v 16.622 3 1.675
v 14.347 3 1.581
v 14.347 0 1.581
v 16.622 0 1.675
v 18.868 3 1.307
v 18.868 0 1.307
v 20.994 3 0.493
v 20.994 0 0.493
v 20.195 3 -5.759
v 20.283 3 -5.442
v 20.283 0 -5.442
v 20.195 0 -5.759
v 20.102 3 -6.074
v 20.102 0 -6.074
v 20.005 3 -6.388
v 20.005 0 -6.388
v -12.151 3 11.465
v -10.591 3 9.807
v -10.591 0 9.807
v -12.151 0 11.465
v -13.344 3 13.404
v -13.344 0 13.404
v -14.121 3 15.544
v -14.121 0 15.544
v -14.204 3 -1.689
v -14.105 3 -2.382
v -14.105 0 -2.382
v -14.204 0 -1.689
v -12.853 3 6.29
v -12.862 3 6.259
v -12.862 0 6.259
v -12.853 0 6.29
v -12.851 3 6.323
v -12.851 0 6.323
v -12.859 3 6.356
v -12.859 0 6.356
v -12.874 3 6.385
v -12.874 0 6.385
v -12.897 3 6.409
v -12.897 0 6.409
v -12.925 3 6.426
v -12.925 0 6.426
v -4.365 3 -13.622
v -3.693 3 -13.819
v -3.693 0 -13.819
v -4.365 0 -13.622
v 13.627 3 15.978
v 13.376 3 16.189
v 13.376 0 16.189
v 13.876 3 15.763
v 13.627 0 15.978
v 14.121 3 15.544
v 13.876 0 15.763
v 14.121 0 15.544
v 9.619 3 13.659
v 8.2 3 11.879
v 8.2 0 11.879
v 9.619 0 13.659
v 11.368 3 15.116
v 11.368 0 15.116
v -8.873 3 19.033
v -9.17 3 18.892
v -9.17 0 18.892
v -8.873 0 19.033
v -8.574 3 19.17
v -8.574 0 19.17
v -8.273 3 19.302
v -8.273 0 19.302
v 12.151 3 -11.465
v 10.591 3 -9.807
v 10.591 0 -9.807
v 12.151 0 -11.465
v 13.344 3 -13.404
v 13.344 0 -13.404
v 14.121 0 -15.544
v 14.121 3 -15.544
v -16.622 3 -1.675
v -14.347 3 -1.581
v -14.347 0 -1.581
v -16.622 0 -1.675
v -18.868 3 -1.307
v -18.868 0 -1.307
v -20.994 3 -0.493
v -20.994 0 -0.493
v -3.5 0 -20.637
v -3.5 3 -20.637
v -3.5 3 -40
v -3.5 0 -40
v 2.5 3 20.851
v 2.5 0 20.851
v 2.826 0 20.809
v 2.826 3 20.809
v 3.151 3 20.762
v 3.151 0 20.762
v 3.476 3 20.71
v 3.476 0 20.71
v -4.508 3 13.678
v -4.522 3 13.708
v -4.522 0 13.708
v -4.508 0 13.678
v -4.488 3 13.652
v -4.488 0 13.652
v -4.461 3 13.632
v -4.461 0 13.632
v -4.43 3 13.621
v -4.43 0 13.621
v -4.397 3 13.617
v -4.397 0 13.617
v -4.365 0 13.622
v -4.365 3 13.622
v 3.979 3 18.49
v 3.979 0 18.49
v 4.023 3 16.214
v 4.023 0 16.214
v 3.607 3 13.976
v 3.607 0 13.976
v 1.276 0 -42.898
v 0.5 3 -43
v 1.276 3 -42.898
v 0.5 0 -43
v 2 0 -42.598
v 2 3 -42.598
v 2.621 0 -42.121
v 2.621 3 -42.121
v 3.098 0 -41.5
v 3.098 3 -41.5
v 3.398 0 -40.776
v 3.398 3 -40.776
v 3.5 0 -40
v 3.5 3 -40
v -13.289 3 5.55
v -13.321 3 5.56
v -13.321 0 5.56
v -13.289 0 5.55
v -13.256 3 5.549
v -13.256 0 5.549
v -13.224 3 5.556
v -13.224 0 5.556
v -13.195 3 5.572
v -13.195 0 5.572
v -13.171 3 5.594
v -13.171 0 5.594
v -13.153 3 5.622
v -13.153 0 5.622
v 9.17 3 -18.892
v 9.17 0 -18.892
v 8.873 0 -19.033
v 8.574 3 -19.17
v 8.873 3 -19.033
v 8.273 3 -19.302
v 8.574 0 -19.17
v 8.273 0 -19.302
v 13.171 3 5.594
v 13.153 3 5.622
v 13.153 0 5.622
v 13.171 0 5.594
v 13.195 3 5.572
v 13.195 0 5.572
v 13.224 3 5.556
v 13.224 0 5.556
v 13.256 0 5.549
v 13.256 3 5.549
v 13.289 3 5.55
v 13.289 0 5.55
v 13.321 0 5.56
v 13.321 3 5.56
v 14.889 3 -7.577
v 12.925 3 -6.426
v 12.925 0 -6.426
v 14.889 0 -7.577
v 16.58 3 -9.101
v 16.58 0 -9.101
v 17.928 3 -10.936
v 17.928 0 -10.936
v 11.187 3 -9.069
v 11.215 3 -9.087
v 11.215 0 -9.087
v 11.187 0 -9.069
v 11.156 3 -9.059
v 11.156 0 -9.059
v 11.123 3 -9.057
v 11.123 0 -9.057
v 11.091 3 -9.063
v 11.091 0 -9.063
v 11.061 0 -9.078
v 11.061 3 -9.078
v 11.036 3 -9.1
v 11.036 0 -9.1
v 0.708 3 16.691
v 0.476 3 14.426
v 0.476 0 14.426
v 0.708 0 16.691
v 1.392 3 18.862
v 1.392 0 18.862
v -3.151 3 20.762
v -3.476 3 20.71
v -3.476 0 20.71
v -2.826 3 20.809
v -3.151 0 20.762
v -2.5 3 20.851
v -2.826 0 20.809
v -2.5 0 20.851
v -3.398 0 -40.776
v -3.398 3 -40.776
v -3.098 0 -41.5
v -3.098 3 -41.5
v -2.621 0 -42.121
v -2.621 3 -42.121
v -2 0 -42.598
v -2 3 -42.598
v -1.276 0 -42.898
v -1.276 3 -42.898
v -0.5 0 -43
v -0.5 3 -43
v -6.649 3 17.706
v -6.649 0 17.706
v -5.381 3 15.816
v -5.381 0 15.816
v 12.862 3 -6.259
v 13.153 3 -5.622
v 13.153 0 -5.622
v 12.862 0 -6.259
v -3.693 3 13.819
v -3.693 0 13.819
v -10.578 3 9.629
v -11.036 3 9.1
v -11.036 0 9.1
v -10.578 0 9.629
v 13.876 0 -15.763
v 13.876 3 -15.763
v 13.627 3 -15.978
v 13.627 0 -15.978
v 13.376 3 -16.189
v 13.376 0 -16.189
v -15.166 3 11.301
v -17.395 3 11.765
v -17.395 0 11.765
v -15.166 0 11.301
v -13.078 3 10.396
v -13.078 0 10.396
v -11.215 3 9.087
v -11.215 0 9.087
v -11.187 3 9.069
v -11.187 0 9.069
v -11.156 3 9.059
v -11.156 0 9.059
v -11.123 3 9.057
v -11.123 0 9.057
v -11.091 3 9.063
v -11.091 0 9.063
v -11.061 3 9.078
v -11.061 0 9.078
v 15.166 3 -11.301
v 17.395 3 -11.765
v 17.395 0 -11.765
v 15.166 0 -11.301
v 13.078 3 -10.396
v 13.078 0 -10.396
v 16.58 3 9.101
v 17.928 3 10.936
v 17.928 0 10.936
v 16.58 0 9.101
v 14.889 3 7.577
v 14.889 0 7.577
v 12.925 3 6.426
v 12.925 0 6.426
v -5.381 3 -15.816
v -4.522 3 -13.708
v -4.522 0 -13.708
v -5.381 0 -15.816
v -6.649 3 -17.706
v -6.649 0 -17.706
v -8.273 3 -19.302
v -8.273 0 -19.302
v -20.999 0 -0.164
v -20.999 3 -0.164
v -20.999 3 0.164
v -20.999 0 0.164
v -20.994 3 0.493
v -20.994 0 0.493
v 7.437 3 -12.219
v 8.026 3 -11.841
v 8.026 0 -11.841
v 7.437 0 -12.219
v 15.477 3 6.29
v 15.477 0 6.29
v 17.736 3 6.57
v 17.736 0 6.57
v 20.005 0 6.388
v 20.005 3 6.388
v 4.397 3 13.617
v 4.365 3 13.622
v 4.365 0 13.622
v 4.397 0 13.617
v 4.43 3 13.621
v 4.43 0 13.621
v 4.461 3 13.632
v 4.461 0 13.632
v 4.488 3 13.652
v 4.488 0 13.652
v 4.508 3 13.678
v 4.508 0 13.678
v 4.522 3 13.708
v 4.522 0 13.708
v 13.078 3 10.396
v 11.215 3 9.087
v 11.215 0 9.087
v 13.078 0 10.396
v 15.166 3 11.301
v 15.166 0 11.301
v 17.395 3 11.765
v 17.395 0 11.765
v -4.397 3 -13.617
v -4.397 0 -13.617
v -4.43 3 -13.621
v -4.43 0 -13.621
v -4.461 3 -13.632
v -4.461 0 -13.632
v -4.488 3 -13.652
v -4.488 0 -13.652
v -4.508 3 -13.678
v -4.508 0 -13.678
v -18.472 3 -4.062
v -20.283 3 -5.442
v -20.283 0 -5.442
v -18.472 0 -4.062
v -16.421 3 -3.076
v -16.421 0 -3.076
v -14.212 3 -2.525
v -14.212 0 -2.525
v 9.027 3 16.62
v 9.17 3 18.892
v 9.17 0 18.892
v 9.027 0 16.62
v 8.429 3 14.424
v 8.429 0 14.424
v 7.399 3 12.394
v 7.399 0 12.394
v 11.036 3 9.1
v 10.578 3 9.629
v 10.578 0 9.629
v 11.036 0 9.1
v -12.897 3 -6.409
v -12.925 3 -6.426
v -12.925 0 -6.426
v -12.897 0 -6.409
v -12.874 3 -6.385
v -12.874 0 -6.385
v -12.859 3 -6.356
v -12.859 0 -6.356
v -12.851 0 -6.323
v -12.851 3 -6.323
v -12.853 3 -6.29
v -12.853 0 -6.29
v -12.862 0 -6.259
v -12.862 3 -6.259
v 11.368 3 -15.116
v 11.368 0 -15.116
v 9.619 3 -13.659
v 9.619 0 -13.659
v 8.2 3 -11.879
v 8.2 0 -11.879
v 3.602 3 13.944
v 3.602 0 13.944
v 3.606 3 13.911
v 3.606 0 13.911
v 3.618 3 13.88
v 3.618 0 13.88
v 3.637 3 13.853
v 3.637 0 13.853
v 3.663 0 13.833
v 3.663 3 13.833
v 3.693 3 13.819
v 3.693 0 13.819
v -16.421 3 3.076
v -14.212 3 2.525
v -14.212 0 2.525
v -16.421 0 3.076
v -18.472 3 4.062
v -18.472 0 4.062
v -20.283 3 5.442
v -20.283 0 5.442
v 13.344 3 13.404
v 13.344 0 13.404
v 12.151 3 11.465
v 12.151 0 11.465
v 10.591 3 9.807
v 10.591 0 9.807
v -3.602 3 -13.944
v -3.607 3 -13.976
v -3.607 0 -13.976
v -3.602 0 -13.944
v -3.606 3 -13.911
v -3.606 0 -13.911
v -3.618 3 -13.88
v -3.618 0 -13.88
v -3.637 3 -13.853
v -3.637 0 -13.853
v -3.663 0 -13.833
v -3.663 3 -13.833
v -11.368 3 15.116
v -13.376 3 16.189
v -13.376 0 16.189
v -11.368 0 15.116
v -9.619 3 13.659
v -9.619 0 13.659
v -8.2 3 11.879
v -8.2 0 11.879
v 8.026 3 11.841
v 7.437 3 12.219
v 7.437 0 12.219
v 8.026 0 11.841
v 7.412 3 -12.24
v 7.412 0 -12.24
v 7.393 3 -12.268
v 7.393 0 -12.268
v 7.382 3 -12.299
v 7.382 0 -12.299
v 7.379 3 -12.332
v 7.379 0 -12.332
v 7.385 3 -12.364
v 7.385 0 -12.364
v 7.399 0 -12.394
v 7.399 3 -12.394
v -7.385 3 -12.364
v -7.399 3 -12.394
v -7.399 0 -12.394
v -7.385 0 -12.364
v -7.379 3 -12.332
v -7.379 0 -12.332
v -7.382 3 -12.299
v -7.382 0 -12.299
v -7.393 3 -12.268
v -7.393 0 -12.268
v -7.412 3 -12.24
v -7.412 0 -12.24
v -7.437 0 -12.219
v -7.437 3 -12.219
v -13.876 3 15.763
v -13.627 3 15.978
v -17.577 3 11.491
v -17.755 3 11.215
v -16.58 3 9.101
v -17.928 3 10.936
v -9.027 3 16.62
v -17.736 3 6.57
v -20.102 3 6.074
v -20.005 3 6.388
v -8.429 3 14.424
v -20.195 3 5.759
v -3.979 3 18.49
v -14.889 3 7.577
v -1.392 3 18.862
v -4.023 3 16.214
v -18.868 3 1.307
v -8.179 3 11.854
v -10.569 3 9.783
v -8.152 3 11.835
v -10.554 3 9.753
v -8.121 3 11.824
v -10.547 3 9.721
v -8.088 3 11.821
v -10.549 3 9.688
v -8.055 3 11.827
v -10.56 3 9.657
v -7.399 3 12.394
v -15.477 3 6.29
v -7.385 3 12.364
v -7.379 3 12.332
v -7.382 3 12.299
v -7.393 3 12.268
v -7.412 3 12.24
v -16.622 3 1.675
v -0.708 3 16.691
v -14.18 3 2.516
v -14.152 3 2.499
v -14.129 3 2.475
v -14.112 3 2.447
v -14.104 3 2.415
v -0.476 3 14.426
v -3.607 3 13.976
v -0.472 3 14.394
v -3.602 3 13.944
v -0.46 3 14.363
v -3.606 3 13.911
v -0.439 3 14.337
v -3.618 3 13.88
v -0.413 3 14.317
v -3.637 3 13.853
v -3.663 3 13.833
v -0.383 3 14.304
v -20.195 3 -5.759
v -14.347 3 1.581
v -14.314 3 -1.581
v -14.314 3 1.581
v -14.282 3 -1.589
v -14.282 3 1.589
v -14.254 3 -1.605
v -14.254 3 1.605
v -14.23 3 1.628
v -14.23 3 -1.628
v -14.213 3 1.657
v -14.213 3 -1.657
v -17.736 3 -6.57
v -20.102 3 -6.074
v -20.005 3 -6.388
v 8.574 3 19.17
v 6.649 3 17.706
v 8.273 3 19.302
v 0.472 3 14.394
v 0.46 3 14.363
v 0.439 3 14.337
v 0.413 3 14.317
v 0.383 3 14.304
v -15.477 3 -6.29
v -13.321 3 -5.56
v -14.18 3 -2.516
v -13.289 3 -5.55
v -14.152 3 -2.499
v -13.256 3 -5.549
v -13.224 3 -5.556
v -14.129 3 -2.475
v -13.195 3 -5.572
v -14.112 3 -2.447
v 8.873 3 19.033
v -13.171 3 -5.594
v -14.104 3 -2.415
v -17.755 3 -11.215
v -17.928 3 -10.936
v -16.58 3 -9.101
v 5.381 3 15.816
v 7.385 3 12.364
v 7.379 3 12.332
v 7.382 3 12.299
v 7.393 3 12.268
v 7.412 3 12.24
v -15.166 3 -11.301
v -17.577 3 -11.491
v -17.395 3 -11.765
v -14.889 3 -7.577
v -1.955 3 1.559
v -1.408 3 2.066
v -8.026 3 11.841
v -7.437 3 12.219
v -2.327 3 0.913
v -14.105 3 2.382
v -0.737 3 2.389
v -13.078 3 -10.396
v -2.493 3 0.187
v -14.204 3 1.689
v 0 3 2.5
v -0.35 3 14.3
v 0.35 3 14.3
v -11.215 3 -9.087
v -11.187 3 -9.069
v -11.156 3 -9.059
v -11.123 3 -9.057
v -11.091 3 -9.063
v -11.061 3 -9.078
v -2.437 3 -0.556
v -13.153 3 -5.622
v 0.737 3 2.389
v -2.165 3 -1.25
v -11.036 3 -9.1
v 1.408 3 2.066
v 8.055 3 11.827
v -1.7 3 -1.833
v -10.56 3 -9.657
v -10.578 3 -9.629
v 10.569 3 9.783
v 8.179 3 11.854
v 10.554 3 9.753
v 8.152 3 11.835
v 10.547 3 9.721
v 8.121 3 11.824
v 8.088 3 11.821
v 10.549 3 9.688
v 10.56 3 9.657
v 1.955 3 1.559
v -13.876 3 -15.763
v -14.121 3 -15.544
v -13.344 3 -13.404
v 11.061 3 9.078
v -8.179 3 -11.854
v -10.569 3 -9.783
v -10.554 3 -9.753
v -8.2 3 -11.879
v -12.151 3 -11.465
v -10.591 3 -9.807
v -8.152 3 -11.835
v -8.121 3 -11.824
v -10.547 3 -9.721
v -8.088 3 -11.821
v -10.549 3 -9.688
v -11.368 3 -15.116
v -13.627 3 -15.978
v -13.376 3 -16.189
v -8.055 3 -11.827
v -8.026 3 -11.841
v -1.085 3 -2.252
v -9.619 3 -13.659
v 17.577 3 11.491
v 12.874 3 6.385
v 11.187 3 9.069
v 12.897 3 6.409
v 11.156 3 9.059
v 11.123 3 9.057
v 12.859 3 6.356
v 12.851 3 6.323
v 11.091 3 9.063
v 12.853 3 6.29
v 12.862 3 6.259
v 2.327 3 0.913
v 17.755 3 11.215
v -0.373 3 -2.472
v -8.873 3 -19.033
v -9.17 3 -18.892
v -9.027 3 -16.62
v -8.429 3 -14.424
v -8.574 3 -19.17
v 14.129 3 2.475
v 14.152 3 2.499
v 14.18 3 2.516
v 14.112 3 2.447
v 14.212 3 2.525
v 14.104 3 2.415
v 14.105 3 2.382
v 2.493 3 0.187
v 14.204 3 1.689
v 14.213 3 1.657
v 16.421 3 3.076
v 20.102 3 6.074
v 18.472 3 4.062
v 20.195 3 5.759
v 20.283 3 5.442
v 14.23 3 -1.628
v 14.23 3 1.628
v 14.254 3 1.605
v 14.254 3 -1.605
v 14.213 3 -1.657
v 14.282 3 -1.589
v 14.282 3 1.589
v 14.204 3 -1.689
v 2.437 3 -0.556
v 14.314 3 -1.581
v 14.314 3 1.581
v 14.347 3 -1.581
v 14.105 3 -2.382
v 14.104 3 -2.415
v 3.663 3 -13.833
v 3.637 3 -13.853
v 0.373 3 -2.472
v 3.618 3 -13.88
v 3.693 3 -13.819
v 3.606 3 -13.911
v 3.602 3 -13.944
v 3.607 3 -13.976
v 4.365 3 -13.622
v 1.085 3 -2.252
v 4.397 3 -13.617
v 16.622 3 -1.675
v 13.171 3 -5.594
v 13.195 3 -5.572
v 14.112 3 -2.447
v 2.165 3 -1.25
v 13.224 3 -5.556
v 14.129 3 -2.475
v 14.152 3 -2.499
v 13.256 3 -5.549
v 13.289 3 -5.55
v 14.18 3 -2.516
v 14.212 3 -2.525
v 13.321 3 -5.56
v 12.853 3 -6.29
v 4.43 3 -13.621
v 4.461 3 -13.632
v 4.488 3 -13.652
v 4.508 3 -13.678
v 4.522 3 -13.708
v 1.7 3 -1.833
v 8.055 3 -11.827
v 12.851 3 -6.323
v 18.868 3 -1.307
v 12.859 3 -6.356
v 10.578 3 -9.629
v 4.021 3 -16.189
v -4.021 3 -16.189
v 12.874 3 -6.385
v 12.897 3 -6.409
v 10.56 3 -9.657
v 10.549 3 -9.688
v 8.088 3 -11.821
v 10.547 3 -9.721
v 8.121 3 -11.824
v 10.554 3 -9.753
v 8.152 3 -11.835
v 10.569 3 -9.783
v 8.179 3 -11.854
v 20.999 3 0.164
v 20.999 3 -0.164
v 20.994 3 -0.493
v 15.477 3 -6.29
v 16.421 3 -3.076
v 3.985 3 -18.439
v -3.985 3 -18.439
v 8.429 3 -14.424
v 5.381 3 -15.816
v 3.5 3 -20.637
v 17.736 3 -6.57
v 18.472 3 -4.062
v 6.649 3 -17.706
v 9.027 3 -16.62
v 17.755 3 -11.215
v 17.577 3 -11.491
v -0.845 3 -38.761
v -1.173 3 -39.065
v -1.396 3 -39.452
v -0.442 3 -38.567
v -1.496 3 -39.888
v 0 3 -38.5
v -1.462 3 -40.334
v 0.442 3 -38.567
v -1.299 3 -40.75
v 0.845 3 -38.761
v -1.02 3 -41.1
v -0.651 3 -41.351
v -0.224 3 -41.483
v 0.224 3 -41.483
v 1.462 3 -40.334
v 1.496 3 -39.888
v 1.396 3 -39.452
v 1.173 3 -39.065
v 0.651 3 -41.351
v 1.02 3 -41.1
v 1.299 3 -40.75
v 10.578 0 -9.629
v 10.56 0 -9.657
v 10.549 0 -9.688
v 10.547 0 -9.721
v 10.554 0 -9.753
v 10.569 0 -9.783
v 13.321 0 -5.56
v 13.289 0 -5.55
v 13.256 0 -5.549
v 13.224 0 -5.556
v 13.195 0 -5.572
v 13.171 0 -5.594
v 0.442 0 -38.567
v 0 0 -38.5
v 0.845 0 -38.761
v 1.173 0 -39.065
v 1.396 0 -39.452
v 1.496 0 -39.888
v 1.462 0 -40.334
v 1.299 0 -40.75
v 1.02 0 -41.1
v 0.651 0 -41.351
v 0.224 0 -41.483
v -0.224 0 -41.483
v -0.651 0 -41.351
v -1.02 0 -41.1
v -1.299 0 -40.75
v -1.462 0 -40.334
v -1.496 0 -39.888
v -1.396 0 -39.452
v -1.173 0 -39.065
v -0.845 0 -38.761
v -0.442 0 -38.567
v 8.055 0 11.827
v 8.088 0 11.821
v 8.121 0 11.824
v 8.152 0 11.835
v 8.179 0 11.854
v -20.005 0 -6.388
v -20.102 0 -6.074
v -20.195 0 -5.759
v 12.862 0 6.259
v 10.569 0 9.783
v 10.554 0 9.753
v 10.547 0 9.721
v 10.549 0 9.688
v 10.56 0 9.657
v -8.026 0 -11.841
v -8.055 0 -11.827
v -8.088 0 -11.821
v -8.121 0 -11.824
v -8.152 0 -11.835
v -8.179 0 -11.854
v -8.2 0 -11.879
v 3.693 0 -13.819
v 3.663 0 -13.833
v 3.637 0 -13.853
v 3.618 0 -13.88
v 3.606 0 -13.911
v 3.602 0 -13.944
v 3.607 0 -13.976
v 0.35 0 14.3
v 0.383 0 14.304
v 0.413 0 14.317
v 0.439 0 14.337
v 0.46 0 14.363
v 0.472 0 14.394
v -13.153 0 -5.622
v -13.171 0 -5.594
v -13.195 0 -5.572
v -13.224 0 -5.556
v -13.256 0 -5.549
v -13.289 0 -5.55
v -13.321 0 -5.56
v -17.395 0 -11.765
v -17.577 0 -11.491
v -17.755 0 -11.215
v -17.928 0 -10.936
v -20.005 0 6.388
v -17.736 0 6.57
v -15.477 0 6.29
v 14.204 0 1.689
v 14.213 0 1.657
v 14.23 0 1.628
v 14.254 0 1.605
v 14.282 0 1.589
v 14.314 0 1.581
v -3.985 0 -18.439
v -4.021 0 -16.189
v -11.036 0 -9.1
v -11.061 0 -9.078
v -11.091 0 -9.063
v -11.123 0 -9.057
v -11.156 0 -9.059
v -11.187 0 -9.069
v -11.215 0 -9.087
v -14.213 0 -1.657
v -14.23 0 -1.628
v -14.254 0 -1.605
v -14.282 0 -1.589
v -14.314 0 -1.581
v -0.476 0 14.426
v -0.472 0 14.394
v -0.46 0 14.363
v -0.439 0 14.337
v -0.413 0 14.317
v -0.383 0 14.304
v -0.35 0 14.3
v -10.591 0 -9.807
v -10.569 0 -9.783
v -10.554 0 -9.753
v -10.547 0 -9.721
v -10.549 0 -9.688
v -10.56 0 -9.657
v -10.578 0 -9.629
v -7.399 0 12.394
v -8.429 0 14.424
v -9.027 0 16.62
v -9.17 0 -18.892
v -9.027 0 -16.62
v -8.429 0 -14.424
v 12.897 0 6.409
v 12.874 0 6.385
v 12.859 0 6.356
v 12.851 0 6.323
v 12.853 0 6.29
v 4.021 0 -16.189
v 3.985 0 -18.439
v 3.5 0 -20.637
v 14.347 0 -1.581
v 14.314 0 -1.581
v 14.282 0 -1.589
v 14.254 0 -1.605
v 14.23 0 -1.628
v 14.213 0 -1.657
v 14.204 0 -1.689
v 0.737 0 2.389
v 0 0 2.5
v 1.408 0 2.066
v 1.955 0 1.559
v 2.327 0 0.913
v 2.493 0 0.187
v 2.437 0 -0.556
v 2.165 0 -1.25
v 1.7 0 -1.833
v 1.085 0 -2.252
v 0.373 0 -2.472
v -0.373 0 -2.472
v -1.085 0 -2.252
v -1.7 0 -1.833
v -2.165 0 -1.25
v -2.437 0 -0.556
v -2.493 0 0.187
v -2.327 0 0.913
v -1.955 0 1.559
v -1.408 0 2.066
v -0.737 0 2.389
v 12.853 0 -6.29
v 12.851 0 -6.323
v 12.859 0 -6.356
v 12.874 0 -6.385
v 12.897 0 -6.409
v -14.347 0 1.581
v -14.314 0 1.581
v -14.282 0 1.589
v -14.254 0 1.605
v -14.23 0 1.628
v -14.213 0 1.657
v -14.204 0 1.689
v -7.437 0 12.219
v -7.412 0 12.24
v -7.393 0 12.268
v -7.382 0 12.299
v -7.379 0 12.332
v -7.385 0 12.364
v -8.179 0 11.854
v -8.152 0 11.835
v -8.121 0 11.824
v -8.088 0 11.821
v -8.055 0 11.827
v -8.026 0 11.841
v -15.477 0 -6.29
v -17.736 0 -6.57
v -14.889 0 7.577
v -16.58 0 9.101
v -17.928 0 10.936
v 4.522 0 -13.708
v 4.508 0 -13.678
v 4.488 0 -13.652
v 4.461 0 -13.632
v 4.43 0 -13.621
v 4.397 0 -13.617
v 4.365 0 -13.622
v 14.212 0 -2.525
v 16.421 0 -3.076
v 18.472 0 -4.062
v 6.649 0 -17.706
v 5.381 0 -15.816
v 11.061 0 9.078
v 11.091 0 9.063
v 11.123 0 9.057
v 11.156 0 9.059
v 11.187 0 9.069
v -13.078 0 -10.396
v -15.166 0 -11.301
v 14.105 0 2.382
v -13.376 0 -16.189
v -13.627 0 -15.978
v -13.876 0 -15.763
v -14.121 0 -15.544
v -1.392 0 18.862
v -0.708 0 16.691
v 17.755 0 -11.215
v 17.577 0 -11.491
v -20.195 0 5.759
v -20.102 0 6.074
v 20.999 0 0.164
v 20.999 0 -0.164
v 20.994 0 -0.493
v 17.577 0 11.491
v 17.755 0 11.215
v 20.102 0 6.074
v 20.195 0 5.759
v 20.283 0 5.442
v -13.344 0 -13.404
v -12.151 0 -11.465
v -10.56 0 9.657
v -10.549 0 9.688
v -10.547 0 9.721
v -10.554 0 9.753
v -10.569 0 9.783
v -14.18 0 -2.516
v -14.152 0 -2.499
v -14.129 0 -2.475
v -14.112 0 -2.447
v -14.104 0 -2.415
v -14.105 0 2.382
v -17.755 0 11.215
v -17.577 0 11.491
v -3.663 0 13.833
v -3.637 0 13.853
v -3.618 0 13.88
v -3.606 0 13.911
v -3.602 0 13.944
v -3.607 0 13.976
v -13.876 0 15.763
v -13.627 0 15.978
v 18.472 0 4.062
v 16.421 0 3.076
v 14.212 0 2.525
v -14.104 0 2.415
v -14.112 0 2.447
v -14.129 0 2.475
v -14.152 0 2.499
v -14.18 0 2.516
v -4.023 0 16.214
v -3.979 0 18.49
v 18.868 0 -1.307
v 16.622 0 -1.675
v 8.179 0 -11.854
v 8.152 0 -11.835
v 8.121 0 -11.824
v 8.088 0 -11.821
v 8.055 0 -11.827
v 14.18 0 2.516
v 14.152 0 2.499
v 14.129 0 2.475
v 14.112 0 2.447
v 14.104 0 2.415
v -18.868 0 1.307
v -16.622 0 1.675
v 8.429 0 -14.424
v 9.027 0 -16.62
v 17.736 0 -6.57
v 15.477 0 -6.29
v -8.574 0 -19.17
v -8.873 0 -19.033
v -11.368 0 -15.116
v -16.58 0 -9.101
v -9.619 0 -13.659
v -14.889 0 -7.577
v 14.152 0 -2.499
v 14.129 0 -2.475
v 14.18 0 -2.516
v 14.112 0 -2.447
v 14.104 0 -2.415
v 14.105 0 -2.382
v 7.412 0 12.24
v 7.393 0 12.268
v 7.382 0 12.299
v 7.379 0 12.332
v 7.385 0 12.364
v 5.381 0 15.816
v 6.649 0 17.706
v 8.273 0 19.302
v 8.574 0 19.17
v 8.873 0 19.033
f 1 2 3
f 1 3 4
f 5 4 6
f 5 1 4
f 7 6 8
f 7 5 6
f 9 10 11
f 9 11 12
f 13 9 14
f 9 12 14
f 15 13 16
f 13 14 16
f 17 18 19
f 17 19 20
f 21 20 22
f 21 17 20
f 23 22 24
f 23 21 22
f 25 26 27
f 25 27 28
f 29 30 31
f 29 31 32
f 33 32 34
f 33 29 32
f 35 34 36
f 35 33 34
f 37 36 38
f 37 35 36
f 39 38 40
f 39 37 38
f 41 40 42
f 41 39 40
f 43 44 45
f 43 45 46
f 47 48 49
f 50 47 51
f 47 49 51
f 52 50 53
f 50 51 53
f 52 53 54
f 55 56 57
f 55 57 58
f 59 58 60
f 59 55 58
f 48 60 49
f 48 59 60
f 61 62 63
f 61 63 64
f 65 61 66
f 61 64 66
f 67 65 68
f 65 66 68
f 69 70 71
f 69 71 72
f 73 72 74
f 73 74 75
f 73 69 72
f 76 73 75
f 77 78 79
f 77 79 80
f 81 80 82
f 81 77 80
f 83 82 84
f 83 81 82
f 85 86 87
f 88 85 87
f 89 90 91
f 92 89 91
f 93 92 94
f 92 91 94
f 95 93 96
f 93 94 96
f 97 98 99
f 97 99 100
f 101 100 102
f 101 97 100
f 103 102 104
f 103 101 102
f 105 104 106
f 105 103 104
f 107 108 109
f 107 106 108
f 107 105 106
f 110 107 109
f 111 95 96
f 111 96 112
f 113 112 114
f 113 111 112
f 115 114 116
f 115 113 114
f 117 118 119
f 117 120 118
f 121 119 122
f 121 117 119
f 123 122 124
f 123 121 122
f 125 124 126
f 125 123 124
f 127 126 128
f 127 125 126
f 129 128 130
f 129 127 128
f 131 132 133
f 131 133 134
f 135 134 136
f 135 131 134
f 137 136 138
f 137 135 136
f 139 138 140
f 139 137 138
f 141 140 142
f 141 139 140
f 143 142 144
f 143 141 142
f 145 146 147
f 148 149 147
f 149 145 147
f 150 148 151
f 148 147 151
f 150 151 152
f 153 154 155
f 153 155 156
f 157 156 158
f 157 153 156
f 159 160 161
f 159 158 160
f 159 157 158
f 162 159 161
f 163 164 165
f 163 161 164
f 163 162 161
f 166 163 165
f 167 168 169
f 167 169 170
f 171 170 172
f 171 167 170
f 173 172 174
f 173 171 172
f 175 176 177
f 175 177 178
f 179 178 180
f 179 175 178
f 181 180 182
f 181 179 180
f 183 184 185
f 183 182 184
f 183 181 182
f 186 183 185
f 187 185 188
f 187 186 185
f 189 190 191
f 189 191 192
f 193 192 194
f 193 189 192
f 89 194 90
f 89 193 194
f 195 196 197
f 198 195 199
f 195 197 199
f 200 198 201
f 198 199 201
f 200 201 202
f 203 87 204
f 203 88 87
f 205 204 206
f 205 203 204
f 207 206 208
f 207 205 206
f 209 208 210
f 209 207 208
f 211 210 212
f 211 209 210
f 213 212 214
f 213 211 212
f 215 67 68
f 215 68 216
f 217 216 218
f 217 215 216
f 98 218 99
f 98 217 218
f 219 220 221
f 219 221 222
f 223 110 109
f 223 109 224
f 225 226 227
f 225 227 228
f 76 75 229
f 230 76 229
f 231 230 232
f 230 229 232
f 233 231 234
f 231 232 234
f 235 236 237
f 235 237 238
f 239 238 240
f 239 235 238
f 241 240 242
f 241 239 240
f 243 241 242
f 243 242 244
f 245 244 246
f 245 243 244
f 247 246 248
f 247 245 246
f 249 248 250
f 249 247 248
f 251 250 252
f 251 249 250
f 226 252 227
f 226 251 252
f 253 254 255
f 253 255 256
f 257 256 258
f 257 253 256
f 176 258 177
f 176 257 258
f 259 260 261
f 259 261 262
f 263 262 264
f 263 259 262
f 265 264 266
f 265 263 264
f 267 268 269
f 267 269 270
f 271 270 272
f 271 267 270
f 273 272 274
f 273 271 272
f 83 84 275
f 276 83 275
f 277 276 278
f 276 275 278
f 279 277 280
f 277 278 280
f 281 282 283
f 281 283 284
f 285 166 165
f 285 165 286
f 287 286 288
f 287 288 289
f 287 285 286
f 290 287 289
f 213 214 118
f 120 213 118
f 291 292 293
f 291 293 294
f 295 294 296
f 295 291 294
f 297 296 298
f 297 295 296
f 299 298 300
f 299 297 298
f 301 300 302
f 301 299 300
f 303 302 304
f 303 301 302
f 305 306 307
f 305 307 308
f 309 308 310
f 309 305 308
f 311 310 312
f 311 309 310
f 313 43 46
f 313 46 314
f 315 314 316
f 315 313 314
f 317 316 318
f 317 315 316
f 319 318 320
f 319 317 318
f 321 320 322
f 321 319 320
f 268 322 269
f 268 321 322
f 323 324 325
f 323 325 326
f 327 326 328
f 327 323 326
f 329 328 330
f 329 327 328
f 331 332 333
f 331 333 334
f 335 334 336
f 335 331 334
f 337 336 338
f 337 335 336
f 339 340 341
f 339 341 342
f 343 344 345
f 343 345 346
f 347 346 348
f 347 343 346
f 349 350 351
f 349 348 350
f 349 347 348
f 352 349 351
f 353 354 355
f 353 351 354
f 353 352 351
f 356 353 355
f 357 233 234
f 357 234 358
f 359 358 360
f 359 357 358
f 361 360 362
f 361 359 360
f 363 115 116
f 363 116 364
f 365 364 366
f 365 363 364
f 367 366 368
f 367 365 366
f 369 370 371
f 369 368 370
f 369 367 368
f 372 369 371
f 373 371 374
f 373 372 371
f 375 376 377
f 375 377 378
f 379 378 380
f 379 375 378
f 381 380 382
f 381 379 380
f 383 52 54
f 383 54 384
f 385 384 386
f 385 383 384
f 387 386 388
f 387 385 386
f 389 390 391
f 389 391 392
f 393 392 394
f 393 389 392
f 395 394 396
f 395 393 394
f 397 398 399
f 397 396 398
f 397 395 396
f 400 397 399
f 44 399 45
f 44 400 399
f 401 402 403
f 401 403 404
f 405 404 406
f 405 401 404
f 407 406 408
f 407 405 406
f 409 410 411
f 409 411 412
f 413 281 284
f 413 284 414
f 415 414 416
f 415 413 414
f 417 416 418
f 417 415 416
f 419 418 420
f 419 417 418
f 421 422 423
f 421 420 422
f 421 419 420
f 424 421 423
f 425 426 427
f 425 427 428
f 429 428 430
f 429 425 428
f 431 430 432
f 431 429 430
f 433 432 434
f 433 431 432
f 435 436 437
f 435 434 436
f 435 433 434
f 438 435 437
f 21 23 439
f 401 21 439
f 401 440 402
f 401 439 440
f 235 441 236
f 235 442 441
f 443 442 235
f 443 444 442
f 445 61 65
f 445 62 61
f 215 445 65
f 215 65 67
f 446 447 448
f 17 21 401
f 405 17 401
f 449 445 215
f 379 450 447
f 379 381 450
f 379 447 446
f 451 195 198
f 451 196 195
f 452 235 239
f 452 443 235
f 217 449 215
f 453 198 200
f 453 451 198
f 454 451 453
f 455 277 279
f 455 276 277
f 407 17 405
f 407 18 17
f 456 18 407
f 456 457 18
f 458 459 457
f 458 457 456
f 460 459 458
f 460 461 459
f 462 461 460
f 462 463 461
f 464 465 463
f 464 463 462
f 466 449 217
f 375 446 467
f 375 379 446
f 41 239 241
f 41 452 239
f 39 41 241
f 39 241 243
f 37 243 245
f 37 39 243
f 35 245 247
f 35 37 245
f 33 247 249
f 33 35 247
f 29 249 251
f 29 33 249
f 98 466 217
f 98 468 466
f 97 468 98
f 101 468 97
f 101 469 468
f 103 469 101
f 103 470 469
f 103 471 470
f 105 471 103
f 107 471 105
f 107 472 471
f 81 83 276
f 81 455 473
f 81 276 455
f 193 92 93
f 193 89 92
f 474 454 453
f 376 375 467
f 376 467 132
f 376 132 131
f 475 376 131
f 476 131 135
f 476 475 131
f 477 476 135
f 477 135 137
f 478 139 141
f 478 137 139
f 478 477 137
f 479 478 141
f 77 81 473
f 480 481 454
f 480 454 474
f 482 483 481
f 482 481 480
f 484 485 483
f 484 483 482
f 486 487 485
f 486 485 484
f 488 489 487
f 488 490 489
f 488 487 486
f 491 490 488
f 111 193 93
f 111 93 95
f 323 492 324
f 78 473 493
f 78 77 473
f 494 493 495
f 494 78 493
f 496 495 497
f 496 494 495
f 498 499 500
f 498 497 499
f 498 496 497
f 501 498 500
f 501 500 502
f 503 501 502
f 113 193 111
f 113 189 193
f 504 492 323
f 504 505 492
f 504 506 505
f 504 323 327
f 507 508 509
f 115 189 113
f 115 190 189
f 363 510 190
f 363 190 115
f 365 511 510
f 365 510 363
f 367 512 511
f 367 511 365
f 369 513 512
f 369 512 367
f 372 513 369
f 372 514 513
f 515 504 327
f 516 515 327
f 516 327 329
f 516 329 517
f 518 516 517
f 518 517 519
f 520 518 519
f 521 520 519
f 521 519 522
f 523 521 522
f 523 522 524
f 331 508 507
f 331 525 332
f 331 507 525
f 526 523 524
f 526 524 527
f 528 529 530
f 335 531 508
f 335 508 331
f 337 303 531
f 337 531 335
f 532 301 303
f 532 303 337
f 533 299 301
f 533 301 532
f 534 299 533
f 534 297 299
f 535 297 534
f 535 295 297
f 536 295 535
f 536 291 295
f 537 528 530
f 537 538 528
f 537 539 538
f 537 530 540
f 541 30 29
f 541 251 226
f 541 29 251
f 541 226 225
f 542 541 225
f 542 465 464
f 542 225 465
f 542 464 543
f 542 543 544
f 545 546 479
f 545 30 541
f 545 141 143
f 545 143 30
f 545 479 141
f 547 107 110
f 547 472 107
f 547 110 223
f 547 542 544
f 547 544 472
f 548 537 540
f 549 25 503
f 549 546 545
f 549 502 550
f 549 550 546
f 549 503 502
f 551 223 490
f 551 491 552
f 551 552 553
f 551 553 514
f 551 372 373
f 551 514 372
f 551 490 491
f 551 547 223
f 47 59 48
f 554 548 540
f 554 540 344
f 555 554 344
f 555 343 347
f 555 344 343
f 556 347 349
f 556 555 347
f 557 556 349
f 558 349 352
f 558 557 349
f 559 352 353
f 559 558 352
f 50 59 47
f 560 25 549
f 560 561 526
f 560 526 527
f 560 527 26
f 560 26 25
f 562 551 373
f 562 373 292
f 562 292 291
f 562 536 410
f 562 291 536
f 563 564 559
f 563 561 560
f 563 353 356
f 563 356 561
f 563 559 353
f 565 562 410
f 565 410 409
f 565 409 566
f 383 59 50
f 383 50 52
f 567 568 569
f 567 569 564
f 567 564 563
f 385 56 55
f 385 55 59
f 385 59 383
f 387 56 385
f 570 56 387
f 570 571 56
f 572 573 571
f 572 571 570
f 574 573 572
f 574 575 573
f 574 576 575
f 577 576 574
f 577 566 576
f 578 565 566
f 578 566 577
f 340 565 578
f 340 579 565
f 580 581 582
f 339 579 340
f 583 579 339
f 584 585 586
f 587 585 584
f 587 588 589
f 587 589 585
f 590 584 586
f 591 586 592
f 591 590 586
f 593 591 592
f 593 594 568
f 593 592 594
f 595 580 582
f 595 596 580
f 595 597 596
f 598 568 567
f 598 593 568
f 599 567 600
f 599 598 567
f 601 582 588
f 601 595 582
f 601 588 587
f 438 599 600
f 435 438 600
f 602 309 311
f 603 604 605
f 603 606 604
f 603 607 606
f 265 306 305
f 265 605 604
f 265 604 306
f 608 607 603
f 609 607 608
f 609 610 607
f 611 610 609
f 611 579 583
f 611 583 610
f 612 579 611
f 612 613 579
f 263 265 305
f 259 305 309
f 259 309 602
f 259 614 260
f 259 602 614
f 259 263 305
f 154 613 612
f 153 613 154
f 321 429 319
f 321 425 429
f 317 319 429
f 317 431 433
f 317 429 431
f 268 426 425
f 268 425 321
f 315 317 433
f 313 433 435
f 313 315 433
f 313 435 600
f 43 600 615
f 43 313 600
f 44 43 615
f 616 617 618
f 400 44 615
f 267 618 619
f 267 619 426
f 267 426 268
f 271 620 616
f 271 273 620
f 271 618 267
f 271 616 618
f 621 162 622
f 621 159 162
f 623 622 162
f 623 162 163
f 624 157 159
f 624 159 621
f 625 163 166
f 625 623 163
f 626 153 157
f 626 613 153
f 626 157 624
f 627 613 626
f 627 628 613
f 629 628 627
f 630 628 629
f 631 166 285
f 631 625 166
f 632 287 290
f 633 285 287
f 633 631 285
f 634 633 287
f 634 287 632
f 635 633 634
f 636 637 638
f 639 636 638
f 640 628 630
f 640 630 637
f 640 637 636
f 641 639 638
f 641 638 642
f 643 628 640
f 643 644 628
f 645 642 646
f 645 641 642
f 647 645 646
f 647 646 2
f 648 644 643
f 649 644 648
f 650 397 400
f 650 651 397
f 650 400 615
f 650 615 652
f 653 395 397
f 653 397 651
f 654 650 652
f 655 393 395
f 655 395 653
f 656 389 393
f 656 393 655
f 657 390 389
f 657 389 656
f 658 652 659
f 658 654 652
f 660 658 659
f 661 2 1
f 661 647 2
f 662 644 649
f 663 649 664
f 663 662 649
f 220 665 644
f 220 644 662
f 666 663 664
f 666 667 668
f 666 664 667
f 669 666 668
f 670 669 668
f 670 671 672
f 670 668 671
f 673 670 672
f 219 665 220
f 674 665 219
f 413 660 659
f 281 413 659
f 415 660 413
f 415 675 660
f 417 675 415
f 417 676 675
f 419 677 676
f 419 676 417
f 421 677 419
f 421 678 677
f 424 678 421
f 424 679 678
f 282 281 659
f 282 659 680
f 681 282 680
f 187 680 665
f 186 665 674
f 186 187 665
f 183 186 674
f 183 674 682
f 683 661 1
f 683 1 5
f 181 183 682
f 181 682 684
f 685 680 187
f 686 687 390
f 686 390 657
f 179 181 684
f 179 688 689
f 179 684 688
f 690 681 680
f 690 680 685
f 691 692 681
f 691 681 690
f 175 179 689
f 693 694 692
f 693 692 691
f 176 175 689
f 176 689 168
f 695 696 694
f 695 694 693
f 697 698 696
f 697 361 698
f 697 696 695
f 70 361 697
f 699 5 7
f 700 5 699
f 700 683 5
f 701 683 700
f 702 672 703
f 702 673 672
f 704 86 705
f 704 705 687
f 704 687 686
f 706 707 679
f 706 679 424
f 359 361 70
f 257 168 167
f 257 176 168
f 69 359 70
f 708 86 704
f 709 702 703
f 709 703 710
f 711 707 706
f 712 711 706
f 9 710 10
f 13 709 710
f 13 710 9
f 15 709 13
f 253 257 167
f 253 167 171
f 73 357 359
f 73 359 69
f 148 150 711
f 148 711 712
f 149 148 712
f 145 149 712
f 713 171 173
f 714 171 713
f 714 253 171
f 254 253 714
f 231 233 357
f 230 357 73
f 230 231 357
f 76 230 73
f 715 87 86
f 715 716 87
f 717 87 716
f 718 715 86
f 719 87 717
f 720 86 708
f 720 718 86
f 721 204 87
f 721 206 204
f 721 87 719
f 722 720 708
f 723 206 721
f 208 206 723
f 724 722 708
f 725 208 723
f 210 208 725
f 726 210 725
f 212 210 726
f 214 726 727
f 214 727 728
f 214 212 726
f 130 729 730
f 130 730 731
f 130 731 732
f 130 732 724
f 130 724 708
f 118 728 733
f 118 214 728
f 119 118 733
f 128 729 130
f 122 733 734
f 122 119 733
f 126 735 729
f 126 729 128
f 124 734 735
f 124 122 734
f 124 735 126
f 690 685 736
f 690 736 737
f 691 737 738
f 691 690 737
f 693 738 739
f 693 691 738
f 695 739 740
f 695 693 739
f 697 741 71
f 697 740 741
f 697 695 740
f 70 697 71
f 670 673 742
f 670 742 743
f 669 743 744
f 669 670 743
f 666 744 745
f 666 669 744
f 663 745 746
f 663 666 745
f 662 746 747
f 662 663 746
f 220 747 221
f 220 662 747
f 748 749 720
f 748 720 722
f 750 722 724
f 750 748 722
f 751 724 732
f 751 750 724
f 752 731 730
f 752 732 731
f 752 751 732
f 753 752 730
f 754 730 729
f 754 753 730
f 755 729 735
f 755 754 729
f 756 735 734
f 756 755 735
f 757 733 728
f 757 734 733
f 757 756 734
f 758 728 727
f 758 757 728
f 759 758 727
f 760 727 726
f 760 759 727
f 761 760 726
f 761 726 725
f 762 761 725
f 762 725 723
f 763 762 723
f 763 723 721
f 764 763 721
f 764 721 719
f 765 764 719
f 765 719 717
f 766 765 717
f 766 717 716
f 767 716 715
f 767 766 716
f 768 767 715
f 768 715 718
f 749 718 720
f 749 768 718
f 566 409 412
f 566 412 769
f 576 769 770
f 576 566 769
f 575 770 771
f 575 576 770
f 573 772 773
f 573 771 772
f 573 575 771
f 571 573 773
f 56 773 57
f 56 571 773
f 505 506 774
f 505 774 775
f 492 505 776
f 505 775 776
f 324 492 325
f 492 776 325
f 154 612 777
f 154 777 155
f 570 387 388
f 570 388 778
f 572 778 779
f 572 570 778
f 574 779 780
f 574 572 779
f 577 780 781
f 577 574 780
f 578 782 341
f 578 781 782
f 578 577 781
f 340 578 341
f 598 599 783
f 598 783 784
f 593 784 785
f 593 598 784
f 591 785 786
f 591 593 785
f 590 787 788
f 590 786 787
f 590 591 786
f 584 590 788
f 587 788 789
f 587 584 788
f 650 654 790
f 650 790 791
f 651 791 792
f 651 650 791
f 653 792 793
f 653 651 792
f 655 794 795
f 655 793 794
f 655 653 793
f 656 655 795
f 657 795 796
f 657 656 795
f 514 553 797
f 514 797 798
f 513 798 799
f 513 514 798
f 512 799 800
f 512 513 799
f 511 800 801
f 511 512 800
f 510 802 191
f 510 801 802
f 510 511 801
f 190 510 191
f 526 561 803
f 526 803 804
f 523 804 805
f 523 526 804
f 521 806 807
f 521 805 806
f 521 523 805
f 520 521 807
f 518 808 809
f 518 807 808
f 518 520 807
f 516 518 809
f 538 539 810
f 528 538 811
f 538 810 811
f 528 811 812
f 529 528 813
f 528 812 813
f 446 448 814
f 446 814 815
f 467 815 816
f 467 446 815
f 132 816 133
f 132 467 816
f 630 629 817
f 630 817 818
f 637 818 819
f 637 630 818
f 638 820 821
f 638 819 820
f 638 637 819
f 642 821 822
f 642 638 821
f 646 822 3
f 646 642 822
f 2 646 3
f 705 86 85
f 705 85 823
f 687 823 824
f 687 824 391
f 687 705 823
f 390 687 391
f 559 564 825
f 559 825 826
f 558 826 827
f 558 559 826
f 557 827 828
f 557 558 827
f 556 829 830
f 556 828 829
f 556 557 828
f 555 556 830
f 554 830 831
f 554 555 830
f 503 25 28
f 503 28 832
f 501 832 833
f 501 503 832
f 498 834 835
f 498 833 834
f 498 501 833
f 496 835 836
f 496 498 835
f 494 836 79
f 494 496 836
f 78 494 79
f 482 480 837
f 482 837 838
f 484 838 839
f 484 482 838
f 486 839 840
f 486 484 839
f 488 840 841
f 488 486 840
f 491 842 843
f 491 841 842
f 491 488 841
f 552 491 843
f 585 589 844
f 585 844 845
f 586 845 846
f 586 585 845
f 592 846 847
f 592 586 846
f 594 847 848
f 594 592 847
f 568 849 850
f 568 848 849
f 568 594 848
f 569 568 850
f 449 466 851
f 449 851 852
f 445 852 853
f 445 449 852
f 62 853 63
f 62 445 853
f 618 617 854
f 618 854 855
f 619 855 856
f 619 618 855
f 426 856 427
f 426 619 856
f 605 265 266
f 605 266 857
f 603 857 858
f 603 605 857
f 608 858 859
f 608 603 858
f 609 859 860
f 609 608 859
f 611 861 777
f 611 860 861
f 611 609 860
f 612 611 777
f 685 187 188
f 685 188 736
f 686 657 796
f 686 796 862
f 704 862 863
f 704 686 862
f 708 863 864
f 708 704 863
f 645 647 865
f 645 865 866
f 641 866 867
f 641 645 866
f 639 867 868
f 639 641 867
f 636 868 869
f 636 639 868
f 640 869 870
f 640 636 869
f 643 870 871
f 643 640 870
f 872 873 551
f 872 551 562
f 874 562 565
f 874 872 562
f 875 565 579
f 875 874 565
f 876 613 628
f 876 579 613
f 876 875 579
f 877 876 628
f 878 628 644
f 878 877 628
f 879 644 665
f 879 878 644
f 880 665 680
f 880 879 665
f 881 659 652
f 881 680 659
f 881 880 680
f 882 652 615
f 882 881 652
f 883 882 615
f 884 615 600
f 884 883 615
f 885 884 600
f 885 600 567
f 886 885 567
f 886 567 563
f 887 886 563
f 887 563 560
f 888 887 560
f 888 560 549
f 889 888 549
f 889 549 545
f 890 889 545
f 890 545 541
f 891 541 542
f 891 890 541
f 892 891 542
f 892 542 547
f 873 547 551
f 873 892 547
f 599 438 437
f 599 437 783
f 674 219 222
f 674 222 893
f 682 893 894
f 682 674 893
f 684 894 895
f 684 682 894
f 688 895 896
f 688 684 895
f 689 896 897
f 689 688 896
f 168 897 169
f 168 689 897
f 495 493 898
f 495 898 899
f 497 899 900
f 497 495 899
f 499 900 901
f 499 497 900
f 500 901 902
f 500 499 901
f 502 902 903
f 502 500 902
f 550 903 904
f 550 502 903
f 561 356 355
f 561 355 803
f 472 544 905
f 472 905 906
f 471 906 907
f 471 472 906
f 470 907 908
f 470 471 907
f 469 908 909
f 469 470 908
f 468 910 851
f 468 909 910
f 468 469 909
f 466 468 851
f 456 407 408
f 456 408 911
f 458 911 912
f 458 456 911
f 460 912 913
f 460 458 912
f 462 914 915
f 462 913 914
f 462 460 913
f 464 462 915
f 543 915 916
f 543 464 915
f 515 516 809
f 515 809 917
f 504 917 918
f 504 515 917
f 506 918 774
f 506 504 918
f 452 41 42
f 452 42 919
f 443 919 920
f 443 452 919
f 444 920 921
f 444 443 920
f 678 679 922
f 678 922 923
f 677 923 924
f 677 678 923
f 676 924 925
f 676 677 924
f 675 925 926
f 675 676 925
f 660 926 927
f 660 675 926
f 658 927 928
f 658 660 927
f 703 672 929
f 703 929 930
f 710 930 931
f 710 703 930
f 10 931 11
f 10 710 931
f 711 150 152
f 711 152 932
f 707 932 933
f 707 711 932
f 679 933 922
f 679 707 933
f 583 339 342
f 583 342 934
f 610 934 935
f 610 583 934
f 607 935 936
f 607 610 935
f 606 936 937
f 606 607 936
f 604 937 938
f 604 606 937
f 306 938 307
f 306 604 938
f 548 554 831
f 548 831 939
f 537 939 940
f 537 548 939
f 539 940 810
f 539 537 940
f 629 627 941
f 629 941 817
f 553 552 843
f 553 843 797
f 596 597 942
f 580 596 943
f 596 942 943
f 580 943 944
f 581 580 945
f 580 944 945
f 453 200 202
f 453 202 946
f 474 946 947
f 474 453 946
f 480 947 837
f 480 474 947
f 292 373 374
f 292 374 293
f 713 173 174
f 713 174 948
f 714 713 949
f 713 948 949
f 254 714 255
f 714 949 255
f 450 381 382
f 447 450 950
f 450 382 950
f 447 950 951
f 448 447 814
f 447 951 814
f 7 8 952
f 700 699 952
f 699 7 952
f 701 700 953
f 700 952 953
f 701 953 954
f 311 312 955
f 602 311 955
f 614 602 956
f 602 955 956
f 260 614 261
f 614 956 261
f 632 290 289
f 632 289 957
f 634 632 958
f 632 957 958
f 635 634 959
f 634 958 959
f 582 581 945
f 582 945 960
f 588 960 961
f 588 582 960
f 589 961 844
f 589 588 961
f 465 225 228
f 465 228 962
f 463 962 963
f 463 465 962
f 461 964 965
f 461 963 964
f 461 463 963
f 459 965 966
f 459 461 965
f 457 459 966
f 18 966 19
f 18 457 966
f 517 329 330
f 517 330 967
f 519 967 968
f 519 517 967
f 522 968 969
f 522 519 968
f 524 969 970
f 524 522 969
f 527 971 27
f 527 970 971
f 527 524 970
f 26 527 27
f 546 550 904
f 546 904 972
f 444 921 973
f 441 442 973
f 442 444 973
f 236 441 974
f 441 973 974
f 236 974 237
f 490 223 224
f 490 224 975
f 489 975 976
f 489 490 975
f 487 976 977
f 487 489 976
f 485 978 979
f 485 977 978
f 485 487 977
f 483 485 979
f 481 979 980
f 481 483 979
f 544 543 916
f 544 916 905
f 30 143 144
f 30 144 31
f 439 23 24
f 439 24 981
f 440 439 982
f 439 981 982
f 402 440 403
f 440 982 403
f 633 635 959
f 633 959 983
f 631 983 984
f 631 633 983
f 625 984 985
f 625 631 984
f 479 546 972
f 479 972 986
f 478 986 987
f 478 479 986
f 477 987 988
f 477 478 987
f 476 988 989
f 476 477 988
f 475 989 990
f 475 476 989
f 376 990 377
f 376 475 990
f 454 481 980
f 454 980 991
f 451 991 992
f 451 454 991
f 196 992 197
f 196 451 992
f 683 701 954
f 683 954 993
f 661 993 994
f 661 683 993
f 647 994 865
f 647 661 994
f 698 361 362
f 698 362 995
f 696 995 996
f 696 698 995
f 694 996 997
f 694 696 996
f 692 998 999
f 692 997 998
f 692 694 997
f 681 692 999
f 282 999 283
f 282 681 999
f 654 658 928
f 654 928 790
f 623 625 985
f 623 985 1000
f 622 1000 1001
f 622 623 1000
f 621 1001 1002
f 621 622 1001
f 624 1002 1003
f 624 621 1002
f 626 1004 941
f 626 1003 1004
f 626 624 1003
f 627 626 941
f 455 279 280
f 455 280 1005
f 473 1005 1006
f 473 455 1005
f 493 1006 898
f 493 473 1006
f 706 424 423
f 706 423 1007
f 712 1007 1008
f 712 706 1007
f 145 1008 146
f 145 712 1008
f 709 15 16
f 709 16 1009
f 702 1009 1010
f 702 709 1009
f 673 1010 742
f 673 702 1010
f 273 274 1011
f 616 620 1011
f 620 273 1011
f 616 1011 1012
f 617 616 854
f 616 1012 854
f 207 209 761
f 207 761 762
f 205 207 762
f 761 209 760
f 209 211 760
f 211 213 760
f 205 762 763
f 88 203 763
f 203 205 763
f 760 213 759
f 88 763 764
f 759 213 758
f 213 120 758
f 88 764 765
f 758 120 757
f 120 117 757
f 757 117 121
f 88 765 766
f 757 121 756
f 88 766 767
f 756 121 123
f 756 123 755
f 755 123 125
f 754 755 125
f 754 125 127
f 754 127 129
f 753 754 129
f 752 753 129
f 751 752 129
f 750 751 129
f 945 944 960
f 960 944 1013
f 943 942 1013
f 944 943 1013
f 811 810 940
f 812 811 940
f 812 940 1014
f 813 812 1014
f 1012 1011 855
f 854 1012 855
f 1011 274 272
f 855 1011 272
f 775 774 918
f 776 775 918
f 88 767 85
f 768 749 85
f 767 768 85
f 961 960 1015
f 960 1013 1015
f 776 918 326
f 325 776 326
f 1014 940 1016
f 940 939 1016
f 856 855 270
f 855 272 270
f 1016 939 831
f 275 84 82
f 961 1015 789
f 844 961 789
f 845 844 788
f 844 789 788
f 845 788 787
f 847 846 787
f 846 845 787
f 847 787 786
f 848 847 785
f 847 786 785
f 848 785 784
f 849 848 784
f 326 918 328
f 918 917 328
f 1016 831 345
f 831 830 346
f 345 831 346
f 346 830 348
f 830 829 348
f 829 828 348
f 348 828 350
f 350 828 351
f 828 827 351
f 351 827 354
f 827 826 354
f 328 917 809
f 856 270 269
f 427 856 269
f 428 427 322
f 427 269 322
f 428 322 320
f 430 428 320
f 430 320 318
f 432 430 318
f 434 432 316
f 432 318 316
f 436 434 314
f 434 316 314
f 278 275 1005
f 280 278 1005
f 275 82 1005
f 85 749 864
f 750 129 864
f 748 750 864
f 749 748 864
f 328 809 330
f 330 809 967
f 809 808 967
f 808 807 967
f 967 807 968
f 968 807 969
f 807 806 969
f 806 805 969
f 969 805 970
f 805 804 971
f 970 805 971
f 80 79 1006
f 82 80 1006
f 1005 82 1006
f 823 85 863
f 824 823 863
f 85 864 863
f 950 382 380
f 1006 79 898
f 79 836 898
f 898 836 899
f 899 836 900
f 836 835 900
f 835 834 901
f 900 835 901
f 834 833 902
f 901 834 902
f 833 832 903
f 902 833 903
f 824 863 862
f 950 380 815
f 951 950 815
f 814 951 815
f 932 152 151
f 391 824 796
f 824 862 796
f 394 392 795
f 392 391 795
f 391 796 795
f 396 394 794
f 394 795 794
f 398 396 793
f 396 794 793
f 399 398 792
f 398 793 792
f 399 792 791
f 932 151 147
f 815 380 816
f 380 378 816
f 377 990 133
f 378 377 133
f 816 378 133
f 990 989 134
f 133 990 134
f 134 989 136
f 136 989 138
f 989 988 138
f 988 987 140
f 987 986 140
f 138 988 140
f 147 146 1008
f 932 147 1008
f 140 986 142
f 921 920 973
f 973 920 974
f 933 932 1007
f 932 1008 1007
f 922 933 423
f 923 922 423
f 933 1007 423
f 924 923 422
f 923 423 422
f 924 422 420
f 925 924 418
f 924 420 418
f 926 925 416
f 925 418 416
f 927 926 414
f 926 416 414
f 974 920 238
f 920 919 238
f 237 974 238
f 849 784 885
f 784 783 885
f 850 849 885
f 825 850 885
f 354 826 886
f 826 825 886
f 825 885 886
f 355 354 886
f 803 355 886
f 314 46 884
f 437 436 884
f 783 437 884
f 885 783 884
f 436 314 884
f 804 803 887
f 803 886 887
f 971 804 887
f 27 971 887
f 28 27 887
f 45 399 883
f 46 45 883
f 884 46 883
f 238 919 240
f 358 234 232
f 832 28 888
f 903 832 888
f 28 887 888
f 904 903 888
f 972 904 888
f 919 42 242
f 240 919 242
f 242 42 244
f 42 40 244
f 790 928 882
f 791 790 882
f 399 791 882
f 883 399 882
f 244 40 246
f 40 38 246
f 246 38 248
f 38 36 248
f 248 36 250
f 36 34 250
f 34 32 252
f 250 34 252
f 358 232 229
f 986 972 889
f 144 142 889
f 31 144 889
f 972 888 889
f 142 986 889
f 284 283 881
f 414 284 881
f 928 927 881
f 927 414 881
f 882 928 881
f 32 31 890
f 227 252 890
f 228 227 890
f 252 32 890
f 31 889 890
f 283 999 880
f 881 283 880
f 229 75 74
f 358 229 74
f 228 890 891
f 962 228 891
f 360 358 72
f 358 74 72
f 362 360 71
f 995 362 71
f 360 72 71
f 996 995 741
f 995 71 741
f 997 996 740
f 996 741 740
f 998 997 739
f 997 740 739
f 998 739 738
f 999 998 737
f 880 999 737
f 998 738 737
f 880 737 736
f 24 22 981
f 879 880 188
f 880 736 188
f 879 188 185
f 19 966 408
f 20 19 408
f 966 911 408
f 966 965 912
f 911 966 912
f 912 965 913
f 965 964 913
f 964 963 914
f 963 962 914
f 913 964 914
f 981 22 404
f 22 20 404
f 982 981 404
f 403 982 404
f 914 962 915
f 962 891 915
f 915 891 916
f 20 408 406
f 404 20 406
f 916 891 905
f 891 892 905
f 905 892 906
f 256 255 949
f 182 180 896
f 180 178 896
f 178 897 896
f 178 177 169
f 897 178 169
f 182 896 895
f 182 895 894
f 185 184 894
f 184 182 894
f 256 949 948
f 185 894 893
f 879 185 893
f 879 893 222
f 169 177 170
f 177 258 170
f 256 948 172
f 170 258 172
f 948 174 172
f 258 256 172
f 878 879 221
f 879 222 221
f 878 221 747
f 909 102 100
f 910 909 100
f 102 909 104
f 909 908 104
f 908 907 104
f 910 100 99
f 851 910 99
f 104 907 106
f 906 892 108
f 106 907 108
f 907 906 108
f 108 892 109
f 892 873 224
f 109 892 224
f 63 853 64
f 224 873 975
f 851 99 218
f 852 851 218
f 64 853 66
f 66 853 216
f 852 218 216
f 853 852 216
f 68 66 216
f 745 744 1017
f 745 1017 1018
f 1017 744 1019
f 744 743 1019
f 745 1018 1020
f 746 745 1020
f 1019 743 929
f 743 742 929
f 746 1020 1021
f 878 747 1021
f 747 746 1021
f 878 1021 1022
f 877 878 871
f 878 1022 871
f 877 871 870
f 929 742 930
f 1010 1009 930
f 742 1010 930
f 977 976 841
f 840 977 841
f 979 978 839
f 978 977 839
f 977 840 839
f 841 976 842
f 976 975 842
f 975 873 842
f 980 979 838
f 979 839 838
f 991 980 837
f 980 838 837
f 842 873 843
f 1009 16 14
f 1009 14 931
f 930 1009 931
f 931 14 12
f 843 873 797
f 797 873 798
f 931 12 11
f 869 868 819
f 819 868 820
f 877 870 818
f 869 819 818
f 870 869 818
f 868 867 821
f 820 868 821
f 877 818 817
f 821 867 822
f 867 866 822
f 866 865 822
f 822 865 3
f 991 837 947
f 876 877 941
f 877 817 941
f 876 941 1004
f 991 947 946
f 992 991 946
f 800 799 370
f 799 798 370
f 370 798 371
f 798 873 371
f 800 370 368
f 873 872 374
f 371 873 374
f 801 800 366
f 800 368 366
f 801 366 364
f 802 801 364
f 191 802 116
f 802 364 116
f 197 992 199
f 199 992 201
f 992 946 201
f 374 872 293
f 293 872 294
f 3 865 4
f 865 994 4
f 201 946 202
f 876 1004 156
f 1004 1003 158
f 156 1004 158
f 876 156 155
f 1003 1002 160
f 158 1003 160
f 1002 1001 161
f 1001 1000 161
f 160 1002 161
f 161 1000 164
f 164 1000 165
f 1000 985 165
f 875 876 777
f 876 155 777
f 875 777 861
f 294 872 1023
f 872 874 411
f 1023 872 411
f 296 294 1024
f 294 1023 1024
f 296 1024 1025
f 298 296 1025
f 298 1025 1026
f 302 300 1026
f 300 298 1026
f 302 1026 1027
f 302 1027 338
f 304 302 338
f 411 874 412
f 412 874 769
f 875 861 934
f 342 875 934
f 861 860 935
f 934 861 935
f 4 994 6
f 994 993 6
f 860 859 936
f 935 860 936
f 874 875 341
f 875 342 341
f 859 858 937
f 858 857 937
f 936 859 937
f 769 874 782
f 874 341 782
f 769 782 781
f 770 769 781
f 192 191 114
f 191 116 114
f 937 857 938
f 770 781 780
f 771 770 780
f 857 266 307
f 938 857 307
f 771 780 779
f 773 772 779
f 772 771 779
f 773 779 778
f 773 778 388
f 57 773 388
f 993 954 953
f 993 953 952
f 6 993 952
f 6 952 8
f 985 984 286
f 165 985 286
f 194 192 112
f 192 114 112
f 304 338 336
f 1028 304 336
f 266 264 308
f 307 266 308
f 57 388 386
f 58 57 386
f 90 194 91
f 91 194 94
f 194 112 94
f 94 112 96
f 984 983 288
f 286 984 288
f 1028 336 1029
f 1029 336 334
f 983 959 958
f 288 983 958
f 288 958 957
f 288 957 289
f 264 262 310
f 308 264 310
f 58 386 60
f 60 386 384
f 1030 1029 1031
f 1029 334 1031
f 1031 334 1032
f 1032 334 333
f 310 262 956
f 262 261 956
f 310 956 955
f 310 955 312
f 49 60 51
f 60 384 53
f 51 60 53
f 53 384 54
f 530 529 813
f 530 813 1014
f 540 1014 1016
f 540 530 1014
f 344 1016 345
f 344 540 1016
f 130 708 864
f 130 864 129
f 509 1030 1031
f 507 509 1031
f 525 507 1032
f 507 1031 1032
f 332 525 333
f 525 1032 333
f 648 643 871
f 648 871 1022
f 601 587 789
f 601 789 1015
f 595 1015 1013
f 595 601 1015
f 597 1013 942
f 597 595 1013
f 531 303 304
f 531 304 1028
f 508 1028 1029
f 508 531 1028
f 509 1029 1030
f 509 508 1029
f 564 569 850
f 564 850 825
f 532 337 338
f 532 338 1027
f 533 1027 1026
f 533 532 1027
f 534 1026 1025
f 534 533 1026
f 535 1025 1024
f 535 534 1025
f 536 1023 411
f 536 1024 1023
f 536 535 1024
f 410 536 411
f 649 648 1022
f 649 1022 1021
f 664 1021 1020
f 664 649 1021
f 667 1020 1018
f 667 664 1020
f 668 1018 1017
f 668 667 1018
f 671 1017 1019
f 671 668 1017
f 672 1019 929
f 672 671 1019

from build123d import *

# Parameters (mm, degrees)
SKETCH1_R               = 21
BOSS_EXTRUDE1_DEPTH     = 3
CUT_EXTRUDE1_DEPTH      = 30.849623113
CUT_EXTRUDE1_DEPTH_BACK = 30.849623113
SKETCH2_R               = 2.5
CUT_EXTRUDE2_DEPTH      = 30.849623113
CIRPATTERN1_COUNT       = 22
SKETCH4_W               = 7
SKETCH4_H               = 30.5
BOSS_EXTRUDE2_DEPTH     = 3
FILLET1_R               = 3
CUT_EXTRUDE3_DEPTH      = 48.947888379
CUT_EXTRUDE3_DEPTH_BACK = 48.947888379
SKETCH5_R               = 1.5


with BuildPart() as part:
    # Sketch1 → Boss-Extrude1 (new body)
    with BuildSketch(Plane(origin=(0, 0, 0), x_dir=(1, 0, 0), z_dir=(0, 1, 0))):
        with Locations(Location((0, 0, 0), (0, 0, 270))):
            Circle(SKETCH1_R)
    extrude(amount=BOSS_EXTRUDE1_DEPTH)

    # Sketch2 → Cut-Extrude1 (cut, two sides: drawn at the far end of the back side and taken through both)
    with BuildSketch(Plane(origin=(0, 3, 0), x_dir=(1, 0, 0), z_dir=(0, 1, 0)).offset(-CUT_EXTRUDE1_DEPTH_BACK)):
        with Locations(Location((0, 0, 0), (0, 0, 270))):
            Circle(SKETCH2_R)
    extrude(amount=CUT_EXTRUDE1_DEPTH + CUT_EXTRUDE1_DEPTH_BACK, mode=Mode.SUBTRACT)

    # Sketch3 → Cut-Extrude2 (cut, symmetric)
    with BuildSketch(Plane(origin=(0, 3, 0), x_dir=(1, 0, 0), z_dir=(0, 1, 0))):
        with BuildLine():
            Line((0.35, 14.3), (-0.35, 14.3))
            ThreePointArc((-0.35, 14.3), (-0.439436957, 14.337046001), (-0.476482958, 14.426482958))
            ThreePointArc((-0.476482958, 14.426482958), (-0.994323602, 17.794147764), (-2.5, 20.850659462))
            ThreePointArc((-2.5, 20.850659462), (0, 21), (2.5, 20.850659462))
            ThreePointArc((2.5, 20.850659462), (0.994323602, 17.794147764), (0.476482958, 14.426482958))
            ThreePointArc((0.476482958, 14.426482958), (0.439436957, 14.337046001), (0.35, 14.3))
        make_face()
    cut_extrude2 = extrude(amount=CUT_EXTRUDE2_DEPTH, both=True, mode=Mode.SUBTRACT)

    # CirPattern1: Cut-Extrude2 ×22 about axis
    cirpattern1_axis = Axis((0, 0, 0), (0, 1, 0))
    for i in range(1, CIRPATTERN1_COUNT):
        add(cut_extrude2.rotate(cirpattern1_axis, i * 360 / CIRPATTERN1_COUNT), mode=Mode.SUBTRACT)

    # Sketch4 → Boss-Extrude2 (add)
    with BuildSketch(Plane(origin=(0, 3, 0), x_dir=(1, 0, 0), z_dir=(0, 1, 0))):
        with Locations((0, 27.75)):
            Rectangle(SKETCH4_W, SKETCH4_H)
    extrude(amount=-BOSS_EXTRUDE2_DEPTH)

    # Fillet1
    fillet1_edges = [part.edges().sort_by_distance(p)[0] for p in [
        (3.5, 1.5, -43),
        (-3.5, 1.5, -43),
    ]]
    fillet(fillet1_edges, radius=FILLET1_R)

    # Sketch5 → Cut-Extrude3 (cut, two sides: drawn at the far end of the back side and taken through both)
    with BuildSketch(Plane(origin=(0, 3, 0), x_dir=(1, 0, 0), z_dir=(0, 1, 0)).offset(-CUT_EXTRUDE3_DEPTH_BACK)):
        with Locations(Location((0, 40, 0), (0, 0, 270))):
            Circle(SKETCH5_R)
    extrude(amount=CUT_EXTRUDE3_DEPTH + CUT_EXTRUDE3_DEPTH_BACK, mode=Mode.SUBTRACT)


solid = part.part
